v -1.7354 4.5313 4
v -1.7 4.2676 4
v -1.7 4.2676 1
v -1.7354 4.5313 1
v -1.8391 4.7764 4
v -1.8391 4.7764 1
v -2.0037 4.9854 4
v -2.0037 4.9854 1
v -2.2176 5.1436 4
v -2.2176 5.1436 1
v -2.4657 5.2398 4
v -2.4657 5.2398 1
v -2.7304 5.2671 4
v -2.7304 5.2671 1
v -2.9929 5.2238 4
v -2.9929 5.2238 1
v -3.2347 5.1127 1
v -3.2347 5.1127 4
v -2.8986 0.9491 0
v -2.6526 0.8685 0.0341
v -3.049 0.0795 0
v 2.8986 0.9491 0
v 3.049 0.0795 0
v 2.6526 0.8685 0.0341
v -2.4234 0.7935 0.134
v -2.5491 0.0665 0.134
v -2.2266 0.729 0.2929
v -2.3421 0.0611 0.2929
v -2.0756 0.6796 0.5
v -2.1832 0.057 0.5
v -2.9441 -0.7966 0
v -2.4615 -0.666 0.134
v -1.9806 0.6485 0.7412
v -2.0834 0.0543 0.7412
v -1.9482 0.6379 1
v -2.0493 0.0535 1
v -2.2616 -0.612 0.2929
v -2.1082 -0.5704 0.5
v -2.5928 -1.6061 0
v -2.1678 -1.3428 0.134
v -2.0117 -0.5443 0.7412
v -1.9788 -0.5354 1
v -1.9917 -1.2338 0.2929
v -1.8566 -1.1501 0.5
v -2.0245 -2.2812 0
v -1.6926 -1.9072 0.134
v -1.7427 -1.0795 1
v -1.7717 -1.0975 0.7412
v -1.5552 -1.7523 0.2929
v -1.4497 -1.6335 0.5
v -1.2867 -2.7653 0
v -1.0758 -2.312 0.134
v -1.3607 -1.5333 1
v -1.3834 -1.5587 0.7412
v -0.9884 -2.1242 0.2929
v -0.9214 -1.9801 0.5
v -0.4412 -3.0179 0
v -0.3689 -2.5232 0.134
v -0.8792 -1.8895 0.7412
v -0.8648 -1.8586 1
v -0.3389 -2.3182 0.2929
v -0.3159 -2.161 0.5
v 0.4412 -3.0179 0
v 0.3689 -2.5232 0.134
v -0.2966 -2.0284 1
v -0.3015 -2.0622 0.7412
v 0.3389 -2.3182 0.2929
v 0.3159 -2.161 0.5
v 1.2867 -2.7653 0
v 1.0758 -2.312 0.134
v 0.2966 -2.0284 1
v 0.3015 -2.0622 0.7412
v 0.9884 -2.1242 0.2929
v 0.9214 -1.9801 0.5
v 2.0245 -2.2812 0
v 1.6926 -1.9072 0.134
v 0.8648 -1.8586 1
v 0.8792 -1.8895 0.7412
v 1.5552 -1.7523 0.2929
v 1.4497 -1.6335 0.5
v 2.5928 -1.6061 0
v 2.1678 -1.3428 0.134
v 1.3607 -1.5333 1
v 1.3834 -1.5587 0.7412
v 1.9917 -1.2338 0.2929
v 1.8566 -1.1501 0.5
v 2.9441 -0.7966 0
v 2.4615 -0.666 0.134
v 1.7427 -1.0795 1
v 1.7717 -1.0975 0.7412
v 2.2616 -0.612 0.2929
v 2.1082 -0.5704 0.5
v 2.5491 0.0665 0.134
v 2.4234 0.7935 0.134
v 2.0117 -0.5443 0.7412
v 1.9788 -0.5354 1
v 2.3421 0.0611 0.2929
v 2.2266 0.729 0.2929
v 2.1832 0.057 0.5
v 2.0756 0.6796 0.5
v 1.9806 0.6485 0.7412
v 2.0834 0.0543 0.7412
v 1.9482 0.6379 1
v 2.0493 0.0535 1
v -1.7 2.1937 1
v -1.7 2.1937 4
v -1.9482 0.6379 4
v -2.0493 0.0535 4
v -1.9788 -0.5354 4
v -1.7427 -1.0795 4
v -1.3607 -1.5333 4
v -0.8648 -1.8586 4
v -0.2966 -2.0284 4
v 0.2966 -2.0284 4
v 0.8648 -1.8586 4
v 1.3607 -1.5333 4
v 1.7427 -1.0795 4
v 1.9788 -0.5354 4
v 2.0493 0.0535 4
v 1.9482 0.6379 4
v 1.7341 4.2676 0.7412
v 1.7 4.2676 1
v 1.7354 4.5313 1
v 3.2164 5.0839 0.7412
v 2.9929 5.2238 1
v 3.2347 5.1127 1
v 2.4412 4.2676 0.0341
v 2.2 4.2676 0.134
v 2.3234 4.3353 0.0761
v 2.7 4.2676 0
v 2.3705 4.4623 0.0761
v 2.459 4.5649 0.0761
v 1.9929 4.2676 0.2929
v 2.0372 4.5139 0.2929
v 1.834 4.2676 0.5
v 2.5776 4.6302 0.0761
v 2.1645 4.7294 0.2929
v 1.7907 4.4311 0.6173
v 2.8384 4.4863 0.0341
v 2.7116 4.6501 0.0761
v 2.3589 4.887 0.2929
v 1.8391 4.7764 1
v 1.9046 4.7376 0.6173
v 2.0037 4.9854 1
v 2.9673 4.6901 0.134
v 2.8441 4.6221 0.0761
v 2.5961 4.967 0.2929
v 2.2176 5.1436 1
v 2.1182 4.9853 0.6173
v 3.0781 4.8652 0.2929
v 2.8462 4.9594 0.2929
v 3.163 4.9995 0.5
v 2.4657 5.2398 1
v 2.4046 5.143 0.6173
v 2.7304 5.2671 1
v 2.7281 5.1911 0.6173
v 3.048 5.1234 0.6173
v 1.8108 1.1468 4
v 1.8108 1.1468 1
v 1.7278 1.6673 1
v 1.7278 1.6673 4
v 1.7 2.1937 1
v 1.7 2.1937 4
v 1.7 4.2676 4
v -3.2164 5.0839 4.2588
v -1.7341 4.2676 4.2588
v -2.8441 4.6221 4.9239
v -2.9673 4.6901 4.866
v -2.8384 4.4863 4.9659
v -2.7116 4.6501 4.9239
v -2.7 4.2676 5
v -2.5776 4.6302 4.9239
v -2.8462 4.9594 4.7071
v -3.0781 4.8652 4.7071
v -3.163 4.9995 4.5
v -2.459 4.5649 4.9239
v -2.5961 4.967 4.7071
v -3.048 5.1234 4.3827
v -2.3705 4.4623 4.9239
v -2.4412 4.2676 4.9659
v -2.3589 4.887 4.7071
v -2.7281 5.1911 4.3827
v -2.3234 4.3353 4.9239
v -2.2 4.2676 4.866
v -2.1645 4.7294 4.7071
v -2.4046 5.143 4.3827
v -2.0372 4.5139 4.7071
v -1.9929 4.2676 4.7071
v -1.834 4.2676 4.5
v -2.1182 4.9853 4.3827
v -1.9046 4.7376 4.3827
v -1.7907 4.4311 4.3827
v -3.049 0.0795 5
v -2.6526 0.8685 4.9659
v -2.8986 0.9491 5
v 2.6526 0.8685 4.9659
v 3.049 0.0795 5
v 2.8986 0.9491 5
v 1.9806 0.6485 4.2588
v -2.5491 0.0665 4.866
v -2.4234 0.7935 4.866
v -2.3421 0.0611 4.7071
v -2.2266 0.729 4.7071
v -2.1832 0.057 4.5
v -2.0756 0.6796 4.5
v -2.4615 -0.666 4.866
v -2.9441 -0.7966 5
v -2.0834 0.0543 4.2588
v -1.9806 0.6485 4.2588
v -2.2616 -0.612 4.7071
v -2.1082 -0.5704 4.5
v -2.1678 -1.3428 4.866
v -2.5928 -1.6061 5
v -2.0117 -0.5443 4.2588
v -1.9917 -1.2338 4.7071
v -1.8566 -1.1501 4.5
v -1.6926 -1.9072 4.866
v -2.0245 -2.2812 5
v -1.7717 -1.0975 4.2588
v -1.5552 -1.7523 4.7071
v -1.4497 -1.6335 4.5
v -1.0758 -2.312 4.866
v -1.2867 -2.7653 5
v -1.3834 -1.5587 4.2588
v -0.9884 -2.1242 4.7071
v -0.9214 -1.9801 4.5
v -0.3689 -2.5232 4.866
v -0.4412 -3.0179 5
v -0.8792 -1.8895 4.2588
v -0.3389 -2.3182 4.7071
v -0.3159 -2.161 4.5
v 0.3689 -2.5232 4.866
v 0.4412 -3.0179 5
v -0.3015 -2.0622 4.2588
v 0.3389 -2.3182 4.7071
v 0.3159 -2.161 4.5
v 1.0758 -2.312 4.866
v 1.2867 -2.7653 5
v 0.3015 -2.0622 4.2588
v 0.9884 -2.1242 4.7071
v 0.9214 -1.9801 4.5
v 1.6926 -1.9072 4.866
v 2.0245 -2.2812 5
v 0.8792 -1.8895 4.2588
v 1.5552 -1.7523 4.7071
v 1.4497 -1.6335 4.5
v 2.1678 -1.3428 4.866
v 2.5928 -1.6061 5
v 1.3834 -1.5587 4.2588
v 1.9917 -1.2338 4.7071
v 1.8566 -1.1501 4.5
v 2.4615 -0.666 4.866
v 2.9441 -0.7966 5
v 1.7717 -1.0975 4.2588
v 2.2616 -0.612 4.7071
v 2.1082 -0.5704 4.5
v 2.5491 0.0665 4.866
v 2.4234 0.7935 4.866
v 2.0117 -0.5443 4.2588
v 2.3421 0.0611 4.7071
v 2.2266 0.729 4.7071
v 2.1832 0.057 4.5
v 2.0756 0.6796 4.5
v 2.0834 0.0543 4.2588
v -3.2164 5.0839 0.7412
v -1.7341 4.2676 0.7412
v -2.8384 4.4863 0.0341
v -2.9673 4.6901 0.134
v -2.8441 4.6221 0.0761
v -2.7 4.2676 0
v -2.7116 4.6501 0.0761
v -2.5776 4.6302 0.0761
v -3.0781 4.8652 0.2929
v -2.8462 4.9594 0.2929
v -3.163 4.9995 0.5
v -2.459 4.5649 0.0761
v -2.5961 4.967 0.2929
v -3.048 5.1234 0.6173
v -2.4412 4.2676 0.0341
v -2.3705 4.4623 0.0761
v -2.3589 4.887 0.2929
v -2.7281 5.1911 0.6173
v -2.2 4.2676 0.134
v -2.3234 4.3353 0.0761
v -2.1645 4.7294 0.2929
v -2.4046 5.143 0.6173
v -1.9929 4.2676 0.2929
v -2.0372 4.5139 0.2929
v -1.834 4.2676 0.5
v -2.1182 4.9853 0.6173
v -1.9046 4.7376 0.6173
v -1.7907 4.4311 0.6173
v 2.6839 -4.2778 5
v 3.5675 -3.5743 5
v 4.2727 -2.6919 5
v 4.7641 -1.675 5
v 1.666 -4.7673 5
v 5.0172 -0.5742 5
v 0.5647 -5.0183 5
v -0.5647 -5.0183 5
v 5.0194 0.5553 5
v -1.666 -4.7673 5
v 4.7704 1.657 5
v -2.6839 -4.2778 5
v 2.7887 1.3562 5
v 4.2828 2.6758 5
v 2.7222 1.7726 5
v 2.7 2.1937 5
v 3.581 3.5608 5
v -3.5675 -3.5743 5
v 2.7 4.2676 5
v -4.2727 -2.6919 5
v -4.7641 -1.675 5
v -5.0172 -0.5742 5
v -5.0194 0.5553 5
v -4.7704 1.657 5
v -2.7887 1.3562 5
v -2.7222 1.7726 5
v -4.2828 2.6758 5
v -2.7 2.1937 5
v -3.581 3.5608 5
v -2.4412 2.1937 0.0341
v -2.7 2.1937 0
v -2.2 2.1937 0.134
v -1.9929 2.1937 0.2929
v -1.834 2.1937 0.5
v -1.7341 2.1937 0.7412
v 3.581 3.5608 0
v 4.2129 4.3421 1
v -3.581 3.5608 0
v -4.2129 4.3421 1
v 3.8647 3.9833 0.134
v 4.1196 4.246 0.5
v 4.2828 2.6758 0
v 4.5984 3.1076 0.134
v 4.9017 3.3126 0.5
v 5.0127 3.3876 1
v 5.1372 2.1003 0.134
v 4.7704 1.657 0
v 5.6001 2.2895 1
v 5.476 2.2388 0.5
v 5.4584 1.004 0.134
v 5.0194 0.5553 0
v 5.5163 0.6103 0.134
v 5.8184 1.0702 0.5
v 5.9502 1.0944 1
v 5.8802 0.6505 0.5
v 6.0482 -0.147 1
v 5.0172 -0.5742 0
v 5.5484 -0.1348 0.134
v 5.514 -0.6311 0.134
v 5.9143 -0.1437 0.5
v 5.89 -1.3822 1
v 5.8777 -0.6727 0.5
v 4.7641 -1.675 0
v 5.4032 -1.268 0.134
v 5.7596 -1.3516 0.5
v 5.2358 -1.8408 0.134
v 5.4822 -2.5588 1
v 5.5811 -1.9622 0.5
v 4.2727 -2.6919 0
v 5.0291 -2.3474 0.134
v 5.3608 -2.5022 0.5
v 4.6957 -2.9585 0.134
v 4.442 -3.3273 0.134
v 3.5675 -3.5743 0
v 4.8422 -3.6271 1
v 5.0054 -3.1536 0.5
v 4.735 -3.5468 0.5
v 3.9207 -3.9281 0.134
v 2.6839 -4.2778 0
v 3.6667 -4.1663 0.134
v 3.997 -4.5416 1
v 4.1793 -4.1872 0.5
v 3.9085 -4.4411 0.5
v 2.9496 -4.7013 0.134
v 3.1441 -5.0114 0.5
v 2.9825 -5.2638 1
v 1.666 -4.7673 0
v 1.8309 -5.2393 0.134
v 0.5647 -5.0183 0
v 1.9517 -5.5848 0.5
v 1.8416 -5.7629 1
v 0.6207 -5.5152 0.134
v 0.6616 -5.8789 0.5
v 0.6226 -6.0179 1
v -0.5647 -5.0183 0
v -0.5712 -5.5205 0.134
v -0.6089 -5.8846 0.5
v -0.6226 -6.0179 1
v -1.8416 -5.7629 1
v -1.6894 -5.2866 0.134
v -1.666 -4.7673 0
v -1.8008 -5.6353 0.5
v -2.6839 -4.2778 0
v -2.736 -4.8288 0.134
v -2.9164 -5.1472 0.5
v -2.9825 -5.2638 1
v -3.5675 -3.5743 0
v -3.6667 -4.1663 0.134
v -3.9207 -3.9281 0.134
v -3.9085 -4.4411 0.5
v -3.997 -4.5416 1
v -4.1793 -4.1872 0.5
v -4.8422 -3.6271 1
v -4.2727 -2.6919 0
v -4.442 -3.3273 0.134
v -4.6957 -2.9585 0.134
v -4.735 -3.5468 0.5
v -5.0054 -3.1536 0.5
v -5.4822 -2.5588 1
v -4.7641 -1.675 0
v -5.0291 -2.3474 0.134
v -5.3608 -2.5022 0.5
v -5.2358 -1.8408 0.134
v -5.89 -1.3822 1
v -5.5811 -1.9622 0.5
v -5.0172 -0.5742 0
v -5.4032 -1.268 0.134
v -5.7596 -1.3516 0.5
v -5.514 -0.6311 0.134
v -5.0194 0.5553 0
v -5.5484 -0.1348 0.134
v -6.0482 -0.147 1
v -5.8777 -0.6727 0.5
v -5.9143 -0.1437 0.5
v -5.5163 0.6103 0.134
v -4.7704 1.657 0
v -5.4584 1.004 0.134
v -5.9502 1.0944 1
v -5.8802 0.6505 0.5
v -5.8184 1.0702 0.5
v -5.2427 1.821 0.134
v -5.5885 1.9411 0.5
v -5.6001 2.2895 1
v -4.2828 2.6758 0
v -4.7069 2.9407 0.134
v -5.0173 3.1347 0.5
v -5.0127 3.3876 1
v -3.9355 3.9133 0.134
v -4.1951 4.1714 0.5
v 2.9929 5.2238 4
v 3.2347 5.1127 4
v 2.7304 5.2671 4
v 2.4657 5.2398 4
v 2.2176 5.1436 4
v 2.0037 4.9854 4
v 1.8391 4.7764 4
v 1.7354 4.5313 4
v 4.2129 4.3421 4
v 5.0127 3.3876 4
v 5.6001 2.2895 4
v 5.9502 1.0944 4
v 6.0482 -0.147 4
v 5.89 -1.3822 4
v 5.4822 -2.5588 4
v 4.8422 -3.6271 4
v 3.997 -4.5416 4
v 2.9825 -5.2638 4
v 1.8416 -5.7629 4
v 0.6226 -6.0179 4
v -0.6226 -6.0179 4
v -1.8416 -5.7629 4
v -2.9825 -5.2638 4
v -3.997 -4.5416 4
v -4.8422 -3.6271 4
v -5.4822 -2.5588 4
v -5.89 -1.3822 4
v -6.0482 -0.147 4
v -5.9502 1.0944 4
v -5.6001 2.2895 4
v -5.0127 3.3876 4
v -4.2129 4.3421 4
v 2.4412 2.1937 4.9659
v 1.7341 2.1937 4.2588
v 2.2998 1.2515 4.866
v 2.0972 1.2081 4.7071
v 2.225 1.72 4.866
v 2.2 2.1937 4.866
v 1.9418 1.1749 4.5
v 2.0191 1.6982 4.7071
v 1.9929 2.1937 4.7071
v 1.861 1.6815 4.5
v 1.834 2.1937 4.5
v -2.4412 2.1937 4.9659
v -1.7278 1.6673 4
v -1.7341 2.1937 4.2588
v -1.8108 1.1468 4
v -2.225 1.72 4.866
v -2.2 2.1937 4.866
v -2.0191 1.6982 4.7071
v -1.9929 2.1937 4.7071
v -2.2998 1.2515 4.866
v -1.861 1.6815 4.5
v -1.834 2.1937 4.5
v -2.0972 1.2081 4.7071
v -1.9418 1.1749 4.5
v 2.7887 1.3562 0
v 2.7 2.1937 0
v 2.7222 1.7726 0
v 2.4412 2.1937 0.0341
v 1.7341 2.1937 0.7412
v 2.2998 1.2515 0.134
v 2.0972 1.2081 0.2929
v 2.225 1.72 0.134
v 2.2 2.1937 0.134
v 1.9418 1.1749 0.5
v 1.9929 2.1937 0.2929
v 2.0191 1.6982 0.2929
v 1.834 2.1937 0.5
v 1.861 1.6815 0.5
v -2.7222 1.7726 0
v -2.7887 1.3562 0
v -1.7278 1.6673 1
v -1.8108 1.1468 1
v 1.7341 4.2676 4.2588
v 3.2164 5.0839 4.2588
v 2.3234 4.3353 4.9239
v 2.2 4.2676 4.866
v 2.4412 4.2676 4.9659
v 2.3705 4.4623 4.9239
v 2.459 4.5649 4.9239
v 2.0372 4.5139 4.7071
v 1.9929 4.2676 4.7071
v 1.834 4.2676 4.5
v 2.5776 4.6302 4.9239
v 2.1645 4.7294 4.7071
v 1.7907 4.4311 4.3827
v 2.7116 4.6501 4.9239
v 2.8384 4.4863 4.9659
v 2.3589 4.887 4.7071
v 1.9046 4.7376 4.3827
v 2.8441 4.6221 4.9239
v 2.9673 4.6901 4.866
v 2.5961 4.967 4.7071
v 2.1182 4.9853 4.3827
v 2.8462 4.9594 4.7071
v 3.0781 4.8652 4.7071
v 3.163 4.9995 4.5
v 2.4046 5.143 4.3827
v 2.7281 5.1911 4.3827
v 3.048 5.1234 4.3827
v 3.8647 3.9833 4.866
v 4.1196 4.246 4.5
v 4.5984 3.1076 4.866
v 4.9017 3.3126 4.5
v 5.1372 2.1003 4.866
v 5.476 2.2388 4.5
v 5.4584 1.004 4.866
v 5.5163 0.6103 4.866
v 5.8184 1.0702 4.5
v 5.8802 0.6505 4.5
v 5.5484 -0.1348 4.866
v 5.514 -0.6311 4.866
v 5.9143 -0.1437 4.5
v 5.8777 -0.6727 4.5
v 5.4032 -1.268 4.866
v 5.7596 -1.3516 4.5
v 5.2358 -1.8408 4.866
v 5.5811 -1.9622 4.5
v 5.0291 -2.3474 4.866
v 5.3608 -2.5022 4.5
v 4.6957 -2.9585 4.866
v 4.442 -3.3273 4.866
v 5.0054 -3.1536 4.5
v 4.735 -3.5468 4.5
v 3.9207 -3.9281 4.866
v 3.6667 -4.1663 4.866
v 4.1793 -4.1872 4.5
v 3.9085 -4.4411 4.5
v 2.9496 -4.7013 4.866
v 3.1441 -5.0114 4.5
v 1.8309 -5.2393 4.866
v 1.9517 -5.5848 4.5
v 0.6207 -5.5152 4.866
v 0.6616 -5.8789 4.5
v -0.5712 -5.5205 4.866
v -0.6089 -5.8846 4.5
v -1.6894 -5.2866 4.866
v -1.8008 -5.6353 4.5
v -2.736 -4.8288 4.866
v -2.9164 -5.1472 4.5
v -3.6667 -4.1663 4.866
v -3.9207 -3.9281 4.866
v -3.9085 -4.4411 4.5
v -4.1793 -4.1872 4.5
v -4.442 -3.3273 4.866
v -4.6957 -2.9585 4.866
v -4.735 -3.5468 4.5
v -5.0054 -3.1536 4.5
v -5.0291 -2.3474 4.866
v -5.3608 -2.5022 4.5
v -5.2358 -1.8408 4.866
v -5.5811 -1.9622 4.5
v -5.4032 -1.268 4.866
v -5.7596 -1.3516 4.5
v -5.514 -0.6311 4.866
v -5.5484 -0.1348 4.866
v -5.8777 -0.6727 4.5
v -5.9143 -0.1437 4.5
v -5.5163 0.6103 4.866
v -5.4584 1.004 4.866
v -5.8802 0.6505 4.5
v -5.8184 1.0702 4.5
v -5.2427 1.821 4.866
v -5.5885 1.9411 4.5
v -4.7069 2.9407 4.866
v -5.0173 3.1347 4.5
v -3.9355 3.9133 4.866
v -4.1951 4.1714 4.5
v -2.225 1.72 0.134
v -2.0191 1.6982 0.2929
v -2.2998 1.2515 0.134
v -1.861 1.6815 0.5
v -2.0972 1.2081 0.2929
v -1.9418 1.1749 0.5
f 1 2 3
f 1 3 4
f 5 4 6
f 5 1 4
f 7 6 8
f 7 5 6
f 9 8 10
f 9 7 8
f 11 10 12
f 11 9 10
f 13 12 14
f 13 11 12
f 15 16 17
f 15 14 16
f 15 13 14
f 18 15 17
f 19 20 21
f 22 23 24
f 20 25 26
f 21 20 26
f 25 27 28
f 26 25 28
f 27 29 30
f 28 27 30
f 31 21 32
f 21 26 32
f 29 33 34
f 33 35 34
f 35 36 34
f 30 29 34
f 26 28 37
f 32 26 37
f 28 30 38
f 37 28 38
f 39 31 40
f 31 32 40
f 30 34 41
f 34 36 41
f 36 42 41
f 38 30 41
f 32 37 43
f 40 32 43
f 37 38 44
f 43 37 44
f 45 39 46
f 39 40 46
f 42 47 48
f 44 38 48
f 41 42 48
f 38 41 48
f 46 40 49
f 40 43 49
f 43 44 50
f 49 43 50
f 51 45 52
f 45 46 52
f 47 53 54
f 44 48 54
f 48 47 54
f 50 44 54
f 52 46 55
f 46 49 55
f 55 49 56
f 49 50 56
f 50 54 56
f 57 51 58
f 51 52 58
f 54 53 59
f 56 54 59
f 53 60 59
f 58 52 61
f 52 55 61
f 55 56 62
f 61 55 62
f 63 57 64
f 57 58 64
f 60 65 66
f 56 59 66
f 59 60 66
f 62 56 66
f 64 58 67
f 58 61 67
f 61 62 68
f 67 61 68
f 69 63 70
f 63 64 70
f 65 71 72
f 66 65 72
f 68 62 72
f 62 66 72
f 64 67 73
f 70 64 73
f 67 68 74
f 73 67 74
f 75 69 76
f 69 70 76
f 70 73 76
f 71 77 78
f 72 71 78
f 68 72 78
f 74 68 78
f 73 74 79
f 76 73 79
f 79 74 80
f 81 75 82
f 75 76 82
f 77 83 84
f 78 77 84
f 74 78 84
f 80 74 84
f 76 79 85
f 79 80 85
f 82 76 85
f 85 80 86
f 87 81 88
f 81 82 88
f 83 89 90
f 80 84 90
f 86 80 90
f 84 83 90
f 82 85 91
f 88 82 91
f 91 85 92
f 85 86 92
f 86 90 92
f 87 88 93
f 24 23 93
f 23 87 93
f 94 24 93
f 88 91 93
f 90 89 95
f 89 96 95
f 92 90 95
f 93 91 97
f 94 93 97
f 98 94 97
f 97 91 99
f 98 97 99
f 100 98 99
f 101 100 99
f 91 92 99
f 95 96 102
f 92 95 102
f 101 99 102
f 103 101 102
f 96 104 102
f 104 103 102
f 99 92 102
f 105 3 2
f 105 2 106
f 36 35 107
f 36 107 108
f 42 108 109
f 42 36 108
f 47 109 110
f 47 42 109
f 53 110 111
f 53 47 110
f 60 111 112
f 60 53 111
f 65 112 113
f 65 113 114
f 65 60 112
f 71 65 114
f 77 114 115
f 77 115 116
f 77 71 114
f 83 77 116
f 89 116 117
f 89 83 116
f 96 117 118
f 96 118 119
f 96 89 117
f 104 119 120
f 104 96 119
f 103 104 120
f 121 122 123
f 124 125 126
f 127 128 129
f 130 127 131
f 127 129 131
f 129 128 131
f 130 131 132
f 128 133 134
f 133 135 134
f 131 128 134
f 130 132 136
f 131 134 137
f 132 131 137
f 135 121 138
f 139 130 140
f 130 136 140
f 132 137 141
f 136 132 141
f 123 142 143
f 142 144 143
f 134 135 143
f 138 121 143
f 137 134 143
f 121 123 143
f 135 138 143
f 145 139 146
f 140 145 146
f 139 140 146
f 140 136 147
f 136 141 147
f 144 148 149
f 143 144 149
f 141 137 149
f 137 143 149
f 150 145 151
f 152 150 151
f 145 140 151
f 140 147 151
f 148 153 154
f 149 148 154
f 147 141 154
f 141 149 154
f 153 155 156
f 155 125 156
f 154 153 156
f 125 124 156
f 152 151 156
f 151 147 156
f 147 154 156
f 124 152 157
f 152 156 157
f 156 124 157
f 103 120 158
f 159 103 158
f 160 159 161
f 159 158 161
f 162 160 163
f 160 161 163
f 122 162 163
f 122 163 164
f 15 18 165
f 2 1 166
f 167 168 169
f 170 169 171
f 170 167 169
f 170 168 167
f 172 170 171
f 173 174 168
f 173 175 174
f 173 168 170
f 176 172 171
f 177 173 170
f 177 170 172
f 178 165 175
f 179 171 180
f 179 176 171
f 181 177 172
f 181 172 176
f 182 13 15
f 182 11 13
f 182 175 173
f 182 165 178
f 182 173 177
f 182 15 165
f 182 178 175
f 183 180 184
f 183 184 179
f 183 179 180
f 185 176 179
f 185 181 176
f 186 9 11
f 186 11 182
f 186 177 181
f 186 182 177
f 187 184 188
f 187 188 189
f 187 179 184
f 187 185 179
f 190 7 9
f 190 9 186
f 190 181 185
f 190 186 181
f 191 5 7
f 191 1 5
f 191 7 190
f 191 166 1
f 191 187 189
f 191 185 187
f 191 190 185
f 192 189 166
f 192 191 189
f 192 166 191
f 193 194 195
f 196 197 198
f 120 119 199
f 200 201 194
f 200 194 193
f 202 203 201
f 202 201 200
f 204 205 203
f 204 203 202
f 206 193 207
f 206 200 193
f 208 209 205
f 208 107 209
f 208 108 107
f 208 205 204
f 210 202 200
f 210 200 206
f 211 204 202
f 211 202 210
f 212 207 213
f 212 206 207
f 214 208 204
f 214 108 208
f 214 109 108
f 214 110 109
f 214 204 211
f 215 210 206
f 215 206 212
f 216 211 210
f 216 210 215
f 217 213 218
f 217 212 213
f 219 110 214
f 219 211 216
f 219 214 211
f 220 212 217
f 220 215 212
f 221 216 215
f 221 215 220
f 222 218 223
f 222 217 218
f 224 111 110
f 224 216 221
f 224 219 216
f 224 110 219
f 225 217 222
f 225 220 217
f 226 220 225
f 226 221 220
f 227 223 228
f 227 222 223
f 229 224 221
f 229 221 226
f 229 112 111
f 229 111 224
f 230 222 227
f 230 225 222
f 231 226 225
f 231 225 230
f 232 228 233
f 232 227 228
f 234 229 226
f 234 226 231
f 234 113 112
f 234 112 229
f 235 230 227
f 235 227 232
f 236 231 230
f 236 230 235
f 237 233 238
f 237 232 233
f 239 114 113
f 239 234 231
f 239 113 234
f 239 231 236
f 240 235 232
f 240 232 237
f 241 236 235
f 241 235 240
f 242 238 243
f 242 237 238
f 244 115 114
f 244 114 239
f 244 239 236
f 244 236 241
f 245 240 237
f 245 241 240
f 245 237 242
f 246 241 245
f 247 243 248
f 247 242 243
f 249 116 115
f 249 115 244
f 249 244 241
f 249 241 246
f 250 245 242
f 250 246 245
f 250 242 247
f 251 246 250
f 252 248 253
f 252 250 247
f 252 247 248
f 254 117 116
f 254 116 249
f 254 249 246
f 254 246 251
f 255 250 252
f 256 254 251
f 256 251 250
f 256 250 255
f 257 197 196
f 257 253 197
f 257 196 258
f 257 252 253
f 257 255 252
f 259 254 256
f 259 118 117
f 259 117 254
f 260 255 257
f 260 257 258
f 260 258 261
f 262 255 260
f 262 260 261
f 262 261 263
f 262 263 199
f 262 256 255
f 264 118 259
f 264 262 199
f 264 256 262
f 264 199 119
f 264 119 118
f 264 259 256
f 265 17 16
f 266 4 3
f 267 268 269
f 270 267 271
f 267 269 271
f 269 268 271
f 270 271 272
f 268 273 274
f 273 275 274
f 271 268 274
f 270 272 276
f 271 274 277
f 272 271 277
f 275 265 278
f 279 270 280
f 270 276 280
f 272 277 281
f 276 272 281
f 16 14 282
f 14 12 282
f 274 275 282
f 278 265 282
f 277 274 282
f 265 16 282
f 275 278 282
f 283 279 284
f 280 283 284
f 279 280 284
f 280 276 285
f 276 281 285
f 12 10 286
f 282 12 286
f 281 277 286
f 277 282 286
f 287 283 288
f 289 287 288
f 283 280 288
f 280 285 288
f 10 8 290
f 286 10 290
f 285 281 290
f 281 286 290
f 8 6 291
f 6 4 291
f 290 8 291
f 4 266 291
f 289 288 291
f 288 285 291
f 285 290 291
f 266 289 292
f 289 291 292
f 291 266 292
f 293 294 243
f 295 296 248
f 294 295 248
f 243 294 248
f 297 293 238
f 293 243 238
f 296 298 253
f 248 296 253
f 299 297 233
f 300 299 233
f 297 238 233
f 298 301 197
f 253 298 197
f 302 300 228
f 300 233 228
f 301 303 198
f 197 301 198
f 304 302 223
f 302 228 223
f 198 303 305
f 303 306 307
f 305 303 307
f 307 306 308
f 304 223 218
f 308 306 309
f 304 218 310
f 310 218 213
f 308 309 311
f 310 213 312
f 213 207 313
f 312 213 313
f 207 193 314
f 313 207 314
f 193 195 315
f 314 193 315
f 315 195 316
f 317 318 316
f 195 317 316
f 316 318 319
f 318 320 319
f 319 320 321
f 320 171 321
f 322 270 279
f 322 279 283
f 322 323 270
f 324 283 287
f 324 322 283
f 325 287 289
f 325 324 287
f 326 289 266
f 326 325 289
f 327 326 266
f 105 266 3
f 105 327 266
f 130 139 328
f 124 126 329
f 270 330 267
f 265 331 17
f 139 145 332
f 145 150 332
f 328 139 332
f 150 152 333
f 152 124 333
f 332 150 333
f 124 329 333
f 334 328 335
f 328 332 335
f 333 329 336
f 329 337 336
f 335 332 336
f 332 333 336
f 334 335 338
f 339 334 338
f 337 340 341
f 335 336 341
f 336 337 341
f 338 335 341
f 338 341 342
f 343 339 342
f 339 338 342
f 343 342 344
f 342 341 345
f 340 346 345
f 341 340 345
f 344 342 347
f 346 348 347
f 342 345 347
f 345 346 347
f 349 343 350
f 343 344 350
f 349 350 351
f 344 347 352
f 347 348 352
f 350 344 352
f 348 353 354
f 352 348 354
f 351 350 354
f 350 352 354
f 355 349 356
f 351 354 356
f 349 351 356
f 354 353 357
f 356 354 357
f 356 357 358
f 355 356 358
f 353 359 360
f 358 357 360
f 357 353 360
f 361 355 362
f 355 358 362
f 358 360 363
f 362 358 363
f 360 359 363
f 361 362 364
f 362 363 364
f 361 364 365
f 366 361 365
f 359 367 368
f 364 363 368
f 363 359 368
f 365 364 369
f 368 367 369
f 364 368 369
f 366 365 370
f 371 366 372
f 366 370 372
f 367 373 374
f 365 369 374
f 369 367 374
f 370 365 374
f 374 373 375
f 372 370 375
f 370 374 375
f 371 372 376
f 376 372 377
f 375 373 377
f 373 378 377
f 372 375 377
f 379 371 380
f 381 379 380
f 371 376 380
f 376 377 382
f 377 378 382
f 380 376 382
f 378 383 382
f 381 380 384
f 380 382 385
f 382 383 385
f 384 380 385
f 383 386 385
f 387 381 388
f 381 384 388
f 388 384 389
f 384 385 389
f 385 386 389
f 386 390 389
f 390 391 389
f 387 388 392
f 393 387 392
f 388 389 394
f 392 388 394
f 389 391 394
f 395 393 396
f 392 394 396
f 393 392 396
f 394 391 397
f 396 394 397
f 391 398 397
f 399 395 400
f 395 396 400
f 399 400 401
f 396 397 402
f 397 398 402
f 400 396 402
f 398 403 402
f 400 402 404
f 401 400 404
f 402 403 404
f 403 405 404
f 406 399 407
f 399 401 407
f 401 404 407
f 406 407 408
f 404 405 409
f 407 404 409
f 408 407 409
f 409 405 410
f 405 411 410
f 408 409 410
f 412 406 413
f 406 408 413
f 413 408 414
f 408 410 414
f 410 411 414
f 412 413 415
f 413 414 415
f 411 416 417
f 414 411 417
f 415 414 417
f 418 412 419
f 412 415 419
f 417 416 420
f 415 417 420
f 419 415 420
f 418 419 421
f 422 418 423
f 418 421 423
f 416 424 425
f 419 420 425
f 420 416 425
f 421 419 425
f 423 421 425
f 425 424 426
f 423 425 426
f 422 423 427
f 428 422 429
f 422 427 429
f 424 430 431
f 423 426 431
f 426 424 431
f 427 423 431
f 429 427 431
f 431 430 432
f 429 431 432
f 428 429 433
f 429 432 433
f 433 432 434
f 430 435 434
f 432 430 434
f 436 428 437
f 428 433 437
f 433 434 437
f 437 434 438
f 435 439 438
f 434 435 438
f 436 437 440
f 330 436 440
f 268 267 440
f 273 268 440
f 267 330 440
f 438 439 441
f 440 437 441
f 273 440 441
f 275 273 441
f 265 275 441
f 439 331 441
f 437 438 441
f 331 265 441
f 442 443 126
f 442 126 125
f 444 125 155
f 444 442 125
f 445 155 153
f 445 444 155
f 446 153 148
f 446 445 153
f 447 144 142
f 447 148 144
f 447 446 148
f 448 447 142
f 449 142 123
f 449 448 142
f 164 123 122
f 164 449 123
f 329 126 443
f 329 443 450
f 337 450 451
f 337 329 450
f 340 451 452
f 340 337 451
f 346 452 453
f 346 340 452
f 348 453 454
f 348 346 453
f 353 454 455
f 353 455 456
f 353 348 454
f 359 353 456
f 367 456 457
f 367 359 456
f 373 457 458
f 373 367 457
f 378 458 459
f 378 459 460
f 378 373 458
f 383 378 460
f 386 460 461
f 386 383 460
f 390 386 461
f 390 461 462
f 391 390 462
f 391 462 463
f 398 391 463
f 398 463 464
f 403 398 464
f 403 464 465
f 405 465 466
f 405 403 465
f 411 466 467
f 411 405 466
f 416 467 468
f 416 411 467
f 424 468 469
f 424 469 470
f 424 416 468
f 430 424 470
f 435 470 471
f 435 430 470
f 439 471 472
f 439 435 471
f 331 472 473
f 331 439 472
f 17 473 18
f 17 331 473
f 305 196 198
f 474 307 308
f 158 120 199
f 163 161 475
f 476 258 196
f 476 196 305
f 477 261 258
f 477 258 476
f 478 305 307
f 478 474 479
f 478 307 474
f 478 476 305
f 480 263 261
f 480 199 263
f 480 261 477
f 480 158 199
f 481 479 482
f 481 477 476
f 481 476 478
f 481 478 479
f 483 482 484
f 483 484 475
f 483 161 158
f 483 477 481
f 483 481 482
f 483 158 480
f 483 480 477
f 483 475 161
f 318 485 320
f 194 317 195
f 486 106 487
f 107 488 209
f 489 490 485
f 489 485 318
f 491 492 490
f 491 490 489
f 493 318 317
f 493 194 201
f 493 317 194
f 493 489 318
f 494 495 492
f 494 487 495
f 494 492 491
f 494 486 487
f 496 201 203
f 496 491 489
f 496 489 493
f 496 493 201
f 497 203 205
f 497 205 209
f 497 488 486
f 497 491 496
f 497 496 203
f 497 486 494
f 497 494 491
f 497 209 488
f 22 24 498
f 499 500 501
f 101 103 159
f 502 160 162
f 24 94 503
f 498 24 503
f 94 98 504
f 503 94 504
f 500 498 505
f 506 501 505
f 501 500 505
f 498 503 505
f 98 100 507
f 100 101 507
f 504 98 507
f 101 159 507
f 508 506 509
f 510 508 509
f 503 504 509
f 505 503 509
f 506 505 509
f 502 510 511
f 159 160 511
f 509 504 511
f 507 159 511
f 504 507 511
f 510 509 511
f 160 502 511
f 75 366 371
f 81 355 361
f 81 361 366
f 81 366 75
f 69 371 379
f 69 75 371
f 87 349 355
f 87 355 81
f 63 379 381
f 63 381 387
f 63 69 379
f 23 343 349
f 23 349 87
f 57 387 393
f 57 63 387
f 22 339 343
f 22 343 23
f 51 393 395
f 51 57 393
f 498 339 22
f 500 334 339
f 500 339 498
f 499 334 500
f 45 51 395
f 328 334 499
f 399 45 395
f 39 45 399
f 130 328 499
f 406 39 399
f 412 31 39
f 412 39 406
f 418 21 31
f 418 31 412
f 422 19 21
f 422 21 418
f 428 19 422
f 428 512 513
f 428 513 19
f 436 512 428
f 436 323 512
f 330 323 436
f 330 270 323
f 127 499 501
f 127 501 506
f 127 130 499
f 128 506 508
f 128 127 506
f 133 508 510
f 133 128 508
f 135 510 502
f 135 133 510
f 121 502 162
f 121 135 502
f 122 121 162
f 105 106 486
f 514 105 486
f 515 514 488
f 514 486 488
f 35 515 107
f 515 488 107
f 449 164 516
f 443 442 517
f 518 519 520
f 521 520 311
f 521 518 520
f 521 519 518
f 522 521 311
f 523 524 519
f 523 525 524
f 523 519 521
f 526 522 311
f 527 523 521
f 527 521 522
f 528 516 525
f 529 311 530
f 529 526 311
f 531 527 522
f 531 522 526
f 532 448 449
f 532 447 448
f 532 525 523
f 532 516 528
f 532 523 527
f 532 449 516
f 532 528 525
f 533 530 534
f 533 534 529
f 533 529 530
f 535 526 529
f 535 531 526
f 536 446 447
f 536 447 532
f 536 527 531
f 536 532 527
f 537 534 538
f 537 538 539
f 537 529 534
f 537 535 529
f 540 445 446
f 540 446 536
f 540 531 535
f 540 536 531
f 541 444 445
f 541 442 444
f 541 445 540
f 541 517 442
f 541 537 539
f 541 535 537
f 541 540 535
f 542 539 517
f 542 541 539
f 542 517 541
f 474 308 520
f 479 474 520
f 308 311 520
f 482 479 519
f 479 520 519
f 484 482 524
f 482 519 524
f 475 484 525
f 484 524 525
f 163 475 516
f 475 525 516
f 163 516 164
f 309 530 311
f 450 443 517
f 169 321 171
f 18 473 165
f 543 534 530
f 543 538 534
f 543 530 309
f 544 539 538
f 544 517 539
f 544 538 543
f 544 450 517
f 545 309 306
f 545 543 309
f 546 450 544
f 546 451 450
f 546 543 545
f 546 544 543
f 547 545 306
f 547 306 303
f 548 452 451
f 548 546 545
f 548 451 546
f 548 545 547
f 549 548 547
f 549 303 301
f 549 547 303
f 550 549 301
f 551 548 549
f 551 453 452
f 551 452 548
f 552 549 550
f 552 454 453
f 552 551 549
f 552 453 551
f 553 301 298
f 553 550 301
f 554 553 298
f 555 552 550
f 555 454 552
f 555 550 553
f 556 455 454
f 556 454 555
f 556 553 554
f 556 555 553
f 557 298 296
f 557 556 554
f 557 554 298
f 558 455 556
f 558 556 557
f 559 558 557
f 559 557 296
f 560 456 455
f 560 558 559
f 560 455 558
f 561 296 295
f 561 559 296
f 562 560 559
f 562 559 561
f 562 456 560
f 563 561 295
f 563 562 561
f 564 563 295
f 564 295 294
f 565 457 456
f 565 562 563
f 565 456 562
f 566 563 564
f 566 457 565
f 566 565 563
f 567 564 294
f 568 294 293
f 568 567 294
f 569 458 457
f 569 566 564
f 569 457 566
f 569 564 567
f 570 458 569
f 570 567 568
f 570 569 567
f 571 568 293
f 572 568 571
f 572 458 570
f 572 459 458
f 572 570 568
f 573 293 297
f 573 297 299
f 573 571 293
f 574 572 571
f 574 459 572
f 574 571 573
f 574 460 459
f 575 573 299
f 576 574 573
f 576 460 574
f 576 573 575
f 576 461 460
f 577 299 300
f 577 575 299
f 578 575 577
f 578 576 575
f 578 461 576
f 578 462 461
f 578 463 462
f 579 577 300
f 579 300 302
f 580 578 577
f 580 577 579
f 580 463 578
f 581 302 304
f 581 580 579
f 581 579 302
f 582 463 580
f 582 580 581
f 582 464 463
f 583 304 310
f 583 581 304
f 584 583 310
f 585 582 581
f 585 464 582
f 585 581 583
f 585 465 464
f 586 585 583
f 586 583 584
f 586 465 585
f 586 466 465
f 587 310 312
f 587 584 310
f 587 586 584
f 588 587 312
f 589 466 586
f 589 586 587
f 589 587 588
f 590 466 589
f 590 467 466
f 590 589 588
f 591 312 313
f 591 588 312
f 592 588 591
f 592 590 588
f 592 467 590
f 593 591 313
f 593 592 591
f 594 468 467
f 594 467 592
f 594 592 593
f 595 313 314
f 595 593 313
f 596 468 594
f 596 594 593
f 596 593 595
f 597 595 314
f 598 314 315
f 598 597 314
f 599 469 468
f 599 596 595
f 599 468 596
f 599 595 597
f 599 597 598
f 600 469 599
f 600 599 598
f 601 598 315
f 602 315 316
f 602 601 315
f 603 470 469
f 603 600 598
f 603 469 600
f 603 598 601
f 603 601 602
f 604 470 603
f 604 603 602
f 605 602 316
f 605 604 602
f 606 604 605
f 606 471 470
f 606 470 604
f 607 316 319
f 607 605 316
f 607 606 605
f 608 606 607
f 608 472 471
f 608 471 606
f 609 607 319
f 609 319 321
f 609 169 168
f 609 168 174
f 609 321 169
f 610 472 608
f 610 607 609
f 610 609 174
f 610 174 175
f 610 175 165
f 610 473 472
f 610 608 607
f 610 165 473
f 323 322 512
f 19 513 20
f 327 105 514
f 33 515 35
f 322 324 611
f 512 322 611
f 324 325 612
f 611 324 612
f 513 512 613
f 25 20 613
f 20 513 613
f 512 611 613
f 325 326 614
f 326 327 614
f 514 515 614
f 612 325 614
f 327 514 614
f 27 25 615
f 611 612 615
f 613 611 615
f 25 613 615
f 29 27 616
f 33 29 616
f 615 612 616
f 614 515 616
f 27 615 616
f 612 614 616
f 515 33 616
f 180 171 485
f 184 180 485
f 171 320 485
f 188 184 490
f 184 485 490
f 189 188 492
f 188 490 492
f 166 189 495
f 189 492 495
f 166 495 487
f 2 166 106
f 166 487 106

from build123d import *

# Parameters (mm, degrees)
BOSS_EXTRUDE1_DEPTH = 5
FILLET1_R           = 5
FILLET3_R           = 1
FILLET4_R           = 1


with BuildPart() as part:
    # Sketch1 → Boss-Extrude1 (new body)
    with BuildSketch(Plane.XY):
        with BuildLine():
            Line((-1.7, 5.806246636), (-1.7, 1.145643924))
            ThreePointArc((-1.7, 1.145643924), (0, -2.05), (1.7, 1.145643924))
            Line((1.7, 1.145643924), (1.7, 5.806246636))
            ThreePointArc((1.7, 5.806246636), (0, -6.05), (-1.7, 5.806246636))
        make_face()
    extrude(amount=BOSS_EXTRUDE1_DEPTH)

    # Fillet1
    fillet1_edges = [part.edges().sort_by_distance(p)[0] for p in [
        (-1.7, 1.145643924, 2.5),
        (1.7, 1.145643924, 2.5),
    ]]
    fillet(fillet1_edges, radius=FILLET1_R)

    # Fillet3
    fillet3_edges = [part.edges().sort_by_distance(p)[0] for p in [
        (-1.7, 5.806246636, 2.5),
        (1.7, 5.806246636, 2.5),
    ]]
    fillet(fillet3_edges, radius=FILLET3_R)

    # Fillet4
    fillet4_edges = [part.edges().sort_by_distance(p)[0] for p in [
        (0, -2.05, 0),
        (0, -2.05, 5),
        (-1.7, 3.230675835, 0),
        (-1.762446697, 1.405980108, 0),
        (1.762446697, 1.405980108, 0),
        (-1.7, 3.230675835, 5),
        (-1.762446697, 1.405980108, 5),
        (1.762446697, 1.405980108, 5),
        (1.7, 3.230675835, 0),
        (1.7, 3.230675835, 5),
        (0, -6.05, 0),
        (-2.217637826, 5.143582452, 0),
        (2.217637826, 5.143582452, 0),
        (0, -6.05, 5),
        (-2.217637826, 5.143582452, 5),
        (2.217637826, 5.143582452, 5),
    ]]
    fillet(fillet4_edges, radius=FILLET4_R)


solid = part.part
